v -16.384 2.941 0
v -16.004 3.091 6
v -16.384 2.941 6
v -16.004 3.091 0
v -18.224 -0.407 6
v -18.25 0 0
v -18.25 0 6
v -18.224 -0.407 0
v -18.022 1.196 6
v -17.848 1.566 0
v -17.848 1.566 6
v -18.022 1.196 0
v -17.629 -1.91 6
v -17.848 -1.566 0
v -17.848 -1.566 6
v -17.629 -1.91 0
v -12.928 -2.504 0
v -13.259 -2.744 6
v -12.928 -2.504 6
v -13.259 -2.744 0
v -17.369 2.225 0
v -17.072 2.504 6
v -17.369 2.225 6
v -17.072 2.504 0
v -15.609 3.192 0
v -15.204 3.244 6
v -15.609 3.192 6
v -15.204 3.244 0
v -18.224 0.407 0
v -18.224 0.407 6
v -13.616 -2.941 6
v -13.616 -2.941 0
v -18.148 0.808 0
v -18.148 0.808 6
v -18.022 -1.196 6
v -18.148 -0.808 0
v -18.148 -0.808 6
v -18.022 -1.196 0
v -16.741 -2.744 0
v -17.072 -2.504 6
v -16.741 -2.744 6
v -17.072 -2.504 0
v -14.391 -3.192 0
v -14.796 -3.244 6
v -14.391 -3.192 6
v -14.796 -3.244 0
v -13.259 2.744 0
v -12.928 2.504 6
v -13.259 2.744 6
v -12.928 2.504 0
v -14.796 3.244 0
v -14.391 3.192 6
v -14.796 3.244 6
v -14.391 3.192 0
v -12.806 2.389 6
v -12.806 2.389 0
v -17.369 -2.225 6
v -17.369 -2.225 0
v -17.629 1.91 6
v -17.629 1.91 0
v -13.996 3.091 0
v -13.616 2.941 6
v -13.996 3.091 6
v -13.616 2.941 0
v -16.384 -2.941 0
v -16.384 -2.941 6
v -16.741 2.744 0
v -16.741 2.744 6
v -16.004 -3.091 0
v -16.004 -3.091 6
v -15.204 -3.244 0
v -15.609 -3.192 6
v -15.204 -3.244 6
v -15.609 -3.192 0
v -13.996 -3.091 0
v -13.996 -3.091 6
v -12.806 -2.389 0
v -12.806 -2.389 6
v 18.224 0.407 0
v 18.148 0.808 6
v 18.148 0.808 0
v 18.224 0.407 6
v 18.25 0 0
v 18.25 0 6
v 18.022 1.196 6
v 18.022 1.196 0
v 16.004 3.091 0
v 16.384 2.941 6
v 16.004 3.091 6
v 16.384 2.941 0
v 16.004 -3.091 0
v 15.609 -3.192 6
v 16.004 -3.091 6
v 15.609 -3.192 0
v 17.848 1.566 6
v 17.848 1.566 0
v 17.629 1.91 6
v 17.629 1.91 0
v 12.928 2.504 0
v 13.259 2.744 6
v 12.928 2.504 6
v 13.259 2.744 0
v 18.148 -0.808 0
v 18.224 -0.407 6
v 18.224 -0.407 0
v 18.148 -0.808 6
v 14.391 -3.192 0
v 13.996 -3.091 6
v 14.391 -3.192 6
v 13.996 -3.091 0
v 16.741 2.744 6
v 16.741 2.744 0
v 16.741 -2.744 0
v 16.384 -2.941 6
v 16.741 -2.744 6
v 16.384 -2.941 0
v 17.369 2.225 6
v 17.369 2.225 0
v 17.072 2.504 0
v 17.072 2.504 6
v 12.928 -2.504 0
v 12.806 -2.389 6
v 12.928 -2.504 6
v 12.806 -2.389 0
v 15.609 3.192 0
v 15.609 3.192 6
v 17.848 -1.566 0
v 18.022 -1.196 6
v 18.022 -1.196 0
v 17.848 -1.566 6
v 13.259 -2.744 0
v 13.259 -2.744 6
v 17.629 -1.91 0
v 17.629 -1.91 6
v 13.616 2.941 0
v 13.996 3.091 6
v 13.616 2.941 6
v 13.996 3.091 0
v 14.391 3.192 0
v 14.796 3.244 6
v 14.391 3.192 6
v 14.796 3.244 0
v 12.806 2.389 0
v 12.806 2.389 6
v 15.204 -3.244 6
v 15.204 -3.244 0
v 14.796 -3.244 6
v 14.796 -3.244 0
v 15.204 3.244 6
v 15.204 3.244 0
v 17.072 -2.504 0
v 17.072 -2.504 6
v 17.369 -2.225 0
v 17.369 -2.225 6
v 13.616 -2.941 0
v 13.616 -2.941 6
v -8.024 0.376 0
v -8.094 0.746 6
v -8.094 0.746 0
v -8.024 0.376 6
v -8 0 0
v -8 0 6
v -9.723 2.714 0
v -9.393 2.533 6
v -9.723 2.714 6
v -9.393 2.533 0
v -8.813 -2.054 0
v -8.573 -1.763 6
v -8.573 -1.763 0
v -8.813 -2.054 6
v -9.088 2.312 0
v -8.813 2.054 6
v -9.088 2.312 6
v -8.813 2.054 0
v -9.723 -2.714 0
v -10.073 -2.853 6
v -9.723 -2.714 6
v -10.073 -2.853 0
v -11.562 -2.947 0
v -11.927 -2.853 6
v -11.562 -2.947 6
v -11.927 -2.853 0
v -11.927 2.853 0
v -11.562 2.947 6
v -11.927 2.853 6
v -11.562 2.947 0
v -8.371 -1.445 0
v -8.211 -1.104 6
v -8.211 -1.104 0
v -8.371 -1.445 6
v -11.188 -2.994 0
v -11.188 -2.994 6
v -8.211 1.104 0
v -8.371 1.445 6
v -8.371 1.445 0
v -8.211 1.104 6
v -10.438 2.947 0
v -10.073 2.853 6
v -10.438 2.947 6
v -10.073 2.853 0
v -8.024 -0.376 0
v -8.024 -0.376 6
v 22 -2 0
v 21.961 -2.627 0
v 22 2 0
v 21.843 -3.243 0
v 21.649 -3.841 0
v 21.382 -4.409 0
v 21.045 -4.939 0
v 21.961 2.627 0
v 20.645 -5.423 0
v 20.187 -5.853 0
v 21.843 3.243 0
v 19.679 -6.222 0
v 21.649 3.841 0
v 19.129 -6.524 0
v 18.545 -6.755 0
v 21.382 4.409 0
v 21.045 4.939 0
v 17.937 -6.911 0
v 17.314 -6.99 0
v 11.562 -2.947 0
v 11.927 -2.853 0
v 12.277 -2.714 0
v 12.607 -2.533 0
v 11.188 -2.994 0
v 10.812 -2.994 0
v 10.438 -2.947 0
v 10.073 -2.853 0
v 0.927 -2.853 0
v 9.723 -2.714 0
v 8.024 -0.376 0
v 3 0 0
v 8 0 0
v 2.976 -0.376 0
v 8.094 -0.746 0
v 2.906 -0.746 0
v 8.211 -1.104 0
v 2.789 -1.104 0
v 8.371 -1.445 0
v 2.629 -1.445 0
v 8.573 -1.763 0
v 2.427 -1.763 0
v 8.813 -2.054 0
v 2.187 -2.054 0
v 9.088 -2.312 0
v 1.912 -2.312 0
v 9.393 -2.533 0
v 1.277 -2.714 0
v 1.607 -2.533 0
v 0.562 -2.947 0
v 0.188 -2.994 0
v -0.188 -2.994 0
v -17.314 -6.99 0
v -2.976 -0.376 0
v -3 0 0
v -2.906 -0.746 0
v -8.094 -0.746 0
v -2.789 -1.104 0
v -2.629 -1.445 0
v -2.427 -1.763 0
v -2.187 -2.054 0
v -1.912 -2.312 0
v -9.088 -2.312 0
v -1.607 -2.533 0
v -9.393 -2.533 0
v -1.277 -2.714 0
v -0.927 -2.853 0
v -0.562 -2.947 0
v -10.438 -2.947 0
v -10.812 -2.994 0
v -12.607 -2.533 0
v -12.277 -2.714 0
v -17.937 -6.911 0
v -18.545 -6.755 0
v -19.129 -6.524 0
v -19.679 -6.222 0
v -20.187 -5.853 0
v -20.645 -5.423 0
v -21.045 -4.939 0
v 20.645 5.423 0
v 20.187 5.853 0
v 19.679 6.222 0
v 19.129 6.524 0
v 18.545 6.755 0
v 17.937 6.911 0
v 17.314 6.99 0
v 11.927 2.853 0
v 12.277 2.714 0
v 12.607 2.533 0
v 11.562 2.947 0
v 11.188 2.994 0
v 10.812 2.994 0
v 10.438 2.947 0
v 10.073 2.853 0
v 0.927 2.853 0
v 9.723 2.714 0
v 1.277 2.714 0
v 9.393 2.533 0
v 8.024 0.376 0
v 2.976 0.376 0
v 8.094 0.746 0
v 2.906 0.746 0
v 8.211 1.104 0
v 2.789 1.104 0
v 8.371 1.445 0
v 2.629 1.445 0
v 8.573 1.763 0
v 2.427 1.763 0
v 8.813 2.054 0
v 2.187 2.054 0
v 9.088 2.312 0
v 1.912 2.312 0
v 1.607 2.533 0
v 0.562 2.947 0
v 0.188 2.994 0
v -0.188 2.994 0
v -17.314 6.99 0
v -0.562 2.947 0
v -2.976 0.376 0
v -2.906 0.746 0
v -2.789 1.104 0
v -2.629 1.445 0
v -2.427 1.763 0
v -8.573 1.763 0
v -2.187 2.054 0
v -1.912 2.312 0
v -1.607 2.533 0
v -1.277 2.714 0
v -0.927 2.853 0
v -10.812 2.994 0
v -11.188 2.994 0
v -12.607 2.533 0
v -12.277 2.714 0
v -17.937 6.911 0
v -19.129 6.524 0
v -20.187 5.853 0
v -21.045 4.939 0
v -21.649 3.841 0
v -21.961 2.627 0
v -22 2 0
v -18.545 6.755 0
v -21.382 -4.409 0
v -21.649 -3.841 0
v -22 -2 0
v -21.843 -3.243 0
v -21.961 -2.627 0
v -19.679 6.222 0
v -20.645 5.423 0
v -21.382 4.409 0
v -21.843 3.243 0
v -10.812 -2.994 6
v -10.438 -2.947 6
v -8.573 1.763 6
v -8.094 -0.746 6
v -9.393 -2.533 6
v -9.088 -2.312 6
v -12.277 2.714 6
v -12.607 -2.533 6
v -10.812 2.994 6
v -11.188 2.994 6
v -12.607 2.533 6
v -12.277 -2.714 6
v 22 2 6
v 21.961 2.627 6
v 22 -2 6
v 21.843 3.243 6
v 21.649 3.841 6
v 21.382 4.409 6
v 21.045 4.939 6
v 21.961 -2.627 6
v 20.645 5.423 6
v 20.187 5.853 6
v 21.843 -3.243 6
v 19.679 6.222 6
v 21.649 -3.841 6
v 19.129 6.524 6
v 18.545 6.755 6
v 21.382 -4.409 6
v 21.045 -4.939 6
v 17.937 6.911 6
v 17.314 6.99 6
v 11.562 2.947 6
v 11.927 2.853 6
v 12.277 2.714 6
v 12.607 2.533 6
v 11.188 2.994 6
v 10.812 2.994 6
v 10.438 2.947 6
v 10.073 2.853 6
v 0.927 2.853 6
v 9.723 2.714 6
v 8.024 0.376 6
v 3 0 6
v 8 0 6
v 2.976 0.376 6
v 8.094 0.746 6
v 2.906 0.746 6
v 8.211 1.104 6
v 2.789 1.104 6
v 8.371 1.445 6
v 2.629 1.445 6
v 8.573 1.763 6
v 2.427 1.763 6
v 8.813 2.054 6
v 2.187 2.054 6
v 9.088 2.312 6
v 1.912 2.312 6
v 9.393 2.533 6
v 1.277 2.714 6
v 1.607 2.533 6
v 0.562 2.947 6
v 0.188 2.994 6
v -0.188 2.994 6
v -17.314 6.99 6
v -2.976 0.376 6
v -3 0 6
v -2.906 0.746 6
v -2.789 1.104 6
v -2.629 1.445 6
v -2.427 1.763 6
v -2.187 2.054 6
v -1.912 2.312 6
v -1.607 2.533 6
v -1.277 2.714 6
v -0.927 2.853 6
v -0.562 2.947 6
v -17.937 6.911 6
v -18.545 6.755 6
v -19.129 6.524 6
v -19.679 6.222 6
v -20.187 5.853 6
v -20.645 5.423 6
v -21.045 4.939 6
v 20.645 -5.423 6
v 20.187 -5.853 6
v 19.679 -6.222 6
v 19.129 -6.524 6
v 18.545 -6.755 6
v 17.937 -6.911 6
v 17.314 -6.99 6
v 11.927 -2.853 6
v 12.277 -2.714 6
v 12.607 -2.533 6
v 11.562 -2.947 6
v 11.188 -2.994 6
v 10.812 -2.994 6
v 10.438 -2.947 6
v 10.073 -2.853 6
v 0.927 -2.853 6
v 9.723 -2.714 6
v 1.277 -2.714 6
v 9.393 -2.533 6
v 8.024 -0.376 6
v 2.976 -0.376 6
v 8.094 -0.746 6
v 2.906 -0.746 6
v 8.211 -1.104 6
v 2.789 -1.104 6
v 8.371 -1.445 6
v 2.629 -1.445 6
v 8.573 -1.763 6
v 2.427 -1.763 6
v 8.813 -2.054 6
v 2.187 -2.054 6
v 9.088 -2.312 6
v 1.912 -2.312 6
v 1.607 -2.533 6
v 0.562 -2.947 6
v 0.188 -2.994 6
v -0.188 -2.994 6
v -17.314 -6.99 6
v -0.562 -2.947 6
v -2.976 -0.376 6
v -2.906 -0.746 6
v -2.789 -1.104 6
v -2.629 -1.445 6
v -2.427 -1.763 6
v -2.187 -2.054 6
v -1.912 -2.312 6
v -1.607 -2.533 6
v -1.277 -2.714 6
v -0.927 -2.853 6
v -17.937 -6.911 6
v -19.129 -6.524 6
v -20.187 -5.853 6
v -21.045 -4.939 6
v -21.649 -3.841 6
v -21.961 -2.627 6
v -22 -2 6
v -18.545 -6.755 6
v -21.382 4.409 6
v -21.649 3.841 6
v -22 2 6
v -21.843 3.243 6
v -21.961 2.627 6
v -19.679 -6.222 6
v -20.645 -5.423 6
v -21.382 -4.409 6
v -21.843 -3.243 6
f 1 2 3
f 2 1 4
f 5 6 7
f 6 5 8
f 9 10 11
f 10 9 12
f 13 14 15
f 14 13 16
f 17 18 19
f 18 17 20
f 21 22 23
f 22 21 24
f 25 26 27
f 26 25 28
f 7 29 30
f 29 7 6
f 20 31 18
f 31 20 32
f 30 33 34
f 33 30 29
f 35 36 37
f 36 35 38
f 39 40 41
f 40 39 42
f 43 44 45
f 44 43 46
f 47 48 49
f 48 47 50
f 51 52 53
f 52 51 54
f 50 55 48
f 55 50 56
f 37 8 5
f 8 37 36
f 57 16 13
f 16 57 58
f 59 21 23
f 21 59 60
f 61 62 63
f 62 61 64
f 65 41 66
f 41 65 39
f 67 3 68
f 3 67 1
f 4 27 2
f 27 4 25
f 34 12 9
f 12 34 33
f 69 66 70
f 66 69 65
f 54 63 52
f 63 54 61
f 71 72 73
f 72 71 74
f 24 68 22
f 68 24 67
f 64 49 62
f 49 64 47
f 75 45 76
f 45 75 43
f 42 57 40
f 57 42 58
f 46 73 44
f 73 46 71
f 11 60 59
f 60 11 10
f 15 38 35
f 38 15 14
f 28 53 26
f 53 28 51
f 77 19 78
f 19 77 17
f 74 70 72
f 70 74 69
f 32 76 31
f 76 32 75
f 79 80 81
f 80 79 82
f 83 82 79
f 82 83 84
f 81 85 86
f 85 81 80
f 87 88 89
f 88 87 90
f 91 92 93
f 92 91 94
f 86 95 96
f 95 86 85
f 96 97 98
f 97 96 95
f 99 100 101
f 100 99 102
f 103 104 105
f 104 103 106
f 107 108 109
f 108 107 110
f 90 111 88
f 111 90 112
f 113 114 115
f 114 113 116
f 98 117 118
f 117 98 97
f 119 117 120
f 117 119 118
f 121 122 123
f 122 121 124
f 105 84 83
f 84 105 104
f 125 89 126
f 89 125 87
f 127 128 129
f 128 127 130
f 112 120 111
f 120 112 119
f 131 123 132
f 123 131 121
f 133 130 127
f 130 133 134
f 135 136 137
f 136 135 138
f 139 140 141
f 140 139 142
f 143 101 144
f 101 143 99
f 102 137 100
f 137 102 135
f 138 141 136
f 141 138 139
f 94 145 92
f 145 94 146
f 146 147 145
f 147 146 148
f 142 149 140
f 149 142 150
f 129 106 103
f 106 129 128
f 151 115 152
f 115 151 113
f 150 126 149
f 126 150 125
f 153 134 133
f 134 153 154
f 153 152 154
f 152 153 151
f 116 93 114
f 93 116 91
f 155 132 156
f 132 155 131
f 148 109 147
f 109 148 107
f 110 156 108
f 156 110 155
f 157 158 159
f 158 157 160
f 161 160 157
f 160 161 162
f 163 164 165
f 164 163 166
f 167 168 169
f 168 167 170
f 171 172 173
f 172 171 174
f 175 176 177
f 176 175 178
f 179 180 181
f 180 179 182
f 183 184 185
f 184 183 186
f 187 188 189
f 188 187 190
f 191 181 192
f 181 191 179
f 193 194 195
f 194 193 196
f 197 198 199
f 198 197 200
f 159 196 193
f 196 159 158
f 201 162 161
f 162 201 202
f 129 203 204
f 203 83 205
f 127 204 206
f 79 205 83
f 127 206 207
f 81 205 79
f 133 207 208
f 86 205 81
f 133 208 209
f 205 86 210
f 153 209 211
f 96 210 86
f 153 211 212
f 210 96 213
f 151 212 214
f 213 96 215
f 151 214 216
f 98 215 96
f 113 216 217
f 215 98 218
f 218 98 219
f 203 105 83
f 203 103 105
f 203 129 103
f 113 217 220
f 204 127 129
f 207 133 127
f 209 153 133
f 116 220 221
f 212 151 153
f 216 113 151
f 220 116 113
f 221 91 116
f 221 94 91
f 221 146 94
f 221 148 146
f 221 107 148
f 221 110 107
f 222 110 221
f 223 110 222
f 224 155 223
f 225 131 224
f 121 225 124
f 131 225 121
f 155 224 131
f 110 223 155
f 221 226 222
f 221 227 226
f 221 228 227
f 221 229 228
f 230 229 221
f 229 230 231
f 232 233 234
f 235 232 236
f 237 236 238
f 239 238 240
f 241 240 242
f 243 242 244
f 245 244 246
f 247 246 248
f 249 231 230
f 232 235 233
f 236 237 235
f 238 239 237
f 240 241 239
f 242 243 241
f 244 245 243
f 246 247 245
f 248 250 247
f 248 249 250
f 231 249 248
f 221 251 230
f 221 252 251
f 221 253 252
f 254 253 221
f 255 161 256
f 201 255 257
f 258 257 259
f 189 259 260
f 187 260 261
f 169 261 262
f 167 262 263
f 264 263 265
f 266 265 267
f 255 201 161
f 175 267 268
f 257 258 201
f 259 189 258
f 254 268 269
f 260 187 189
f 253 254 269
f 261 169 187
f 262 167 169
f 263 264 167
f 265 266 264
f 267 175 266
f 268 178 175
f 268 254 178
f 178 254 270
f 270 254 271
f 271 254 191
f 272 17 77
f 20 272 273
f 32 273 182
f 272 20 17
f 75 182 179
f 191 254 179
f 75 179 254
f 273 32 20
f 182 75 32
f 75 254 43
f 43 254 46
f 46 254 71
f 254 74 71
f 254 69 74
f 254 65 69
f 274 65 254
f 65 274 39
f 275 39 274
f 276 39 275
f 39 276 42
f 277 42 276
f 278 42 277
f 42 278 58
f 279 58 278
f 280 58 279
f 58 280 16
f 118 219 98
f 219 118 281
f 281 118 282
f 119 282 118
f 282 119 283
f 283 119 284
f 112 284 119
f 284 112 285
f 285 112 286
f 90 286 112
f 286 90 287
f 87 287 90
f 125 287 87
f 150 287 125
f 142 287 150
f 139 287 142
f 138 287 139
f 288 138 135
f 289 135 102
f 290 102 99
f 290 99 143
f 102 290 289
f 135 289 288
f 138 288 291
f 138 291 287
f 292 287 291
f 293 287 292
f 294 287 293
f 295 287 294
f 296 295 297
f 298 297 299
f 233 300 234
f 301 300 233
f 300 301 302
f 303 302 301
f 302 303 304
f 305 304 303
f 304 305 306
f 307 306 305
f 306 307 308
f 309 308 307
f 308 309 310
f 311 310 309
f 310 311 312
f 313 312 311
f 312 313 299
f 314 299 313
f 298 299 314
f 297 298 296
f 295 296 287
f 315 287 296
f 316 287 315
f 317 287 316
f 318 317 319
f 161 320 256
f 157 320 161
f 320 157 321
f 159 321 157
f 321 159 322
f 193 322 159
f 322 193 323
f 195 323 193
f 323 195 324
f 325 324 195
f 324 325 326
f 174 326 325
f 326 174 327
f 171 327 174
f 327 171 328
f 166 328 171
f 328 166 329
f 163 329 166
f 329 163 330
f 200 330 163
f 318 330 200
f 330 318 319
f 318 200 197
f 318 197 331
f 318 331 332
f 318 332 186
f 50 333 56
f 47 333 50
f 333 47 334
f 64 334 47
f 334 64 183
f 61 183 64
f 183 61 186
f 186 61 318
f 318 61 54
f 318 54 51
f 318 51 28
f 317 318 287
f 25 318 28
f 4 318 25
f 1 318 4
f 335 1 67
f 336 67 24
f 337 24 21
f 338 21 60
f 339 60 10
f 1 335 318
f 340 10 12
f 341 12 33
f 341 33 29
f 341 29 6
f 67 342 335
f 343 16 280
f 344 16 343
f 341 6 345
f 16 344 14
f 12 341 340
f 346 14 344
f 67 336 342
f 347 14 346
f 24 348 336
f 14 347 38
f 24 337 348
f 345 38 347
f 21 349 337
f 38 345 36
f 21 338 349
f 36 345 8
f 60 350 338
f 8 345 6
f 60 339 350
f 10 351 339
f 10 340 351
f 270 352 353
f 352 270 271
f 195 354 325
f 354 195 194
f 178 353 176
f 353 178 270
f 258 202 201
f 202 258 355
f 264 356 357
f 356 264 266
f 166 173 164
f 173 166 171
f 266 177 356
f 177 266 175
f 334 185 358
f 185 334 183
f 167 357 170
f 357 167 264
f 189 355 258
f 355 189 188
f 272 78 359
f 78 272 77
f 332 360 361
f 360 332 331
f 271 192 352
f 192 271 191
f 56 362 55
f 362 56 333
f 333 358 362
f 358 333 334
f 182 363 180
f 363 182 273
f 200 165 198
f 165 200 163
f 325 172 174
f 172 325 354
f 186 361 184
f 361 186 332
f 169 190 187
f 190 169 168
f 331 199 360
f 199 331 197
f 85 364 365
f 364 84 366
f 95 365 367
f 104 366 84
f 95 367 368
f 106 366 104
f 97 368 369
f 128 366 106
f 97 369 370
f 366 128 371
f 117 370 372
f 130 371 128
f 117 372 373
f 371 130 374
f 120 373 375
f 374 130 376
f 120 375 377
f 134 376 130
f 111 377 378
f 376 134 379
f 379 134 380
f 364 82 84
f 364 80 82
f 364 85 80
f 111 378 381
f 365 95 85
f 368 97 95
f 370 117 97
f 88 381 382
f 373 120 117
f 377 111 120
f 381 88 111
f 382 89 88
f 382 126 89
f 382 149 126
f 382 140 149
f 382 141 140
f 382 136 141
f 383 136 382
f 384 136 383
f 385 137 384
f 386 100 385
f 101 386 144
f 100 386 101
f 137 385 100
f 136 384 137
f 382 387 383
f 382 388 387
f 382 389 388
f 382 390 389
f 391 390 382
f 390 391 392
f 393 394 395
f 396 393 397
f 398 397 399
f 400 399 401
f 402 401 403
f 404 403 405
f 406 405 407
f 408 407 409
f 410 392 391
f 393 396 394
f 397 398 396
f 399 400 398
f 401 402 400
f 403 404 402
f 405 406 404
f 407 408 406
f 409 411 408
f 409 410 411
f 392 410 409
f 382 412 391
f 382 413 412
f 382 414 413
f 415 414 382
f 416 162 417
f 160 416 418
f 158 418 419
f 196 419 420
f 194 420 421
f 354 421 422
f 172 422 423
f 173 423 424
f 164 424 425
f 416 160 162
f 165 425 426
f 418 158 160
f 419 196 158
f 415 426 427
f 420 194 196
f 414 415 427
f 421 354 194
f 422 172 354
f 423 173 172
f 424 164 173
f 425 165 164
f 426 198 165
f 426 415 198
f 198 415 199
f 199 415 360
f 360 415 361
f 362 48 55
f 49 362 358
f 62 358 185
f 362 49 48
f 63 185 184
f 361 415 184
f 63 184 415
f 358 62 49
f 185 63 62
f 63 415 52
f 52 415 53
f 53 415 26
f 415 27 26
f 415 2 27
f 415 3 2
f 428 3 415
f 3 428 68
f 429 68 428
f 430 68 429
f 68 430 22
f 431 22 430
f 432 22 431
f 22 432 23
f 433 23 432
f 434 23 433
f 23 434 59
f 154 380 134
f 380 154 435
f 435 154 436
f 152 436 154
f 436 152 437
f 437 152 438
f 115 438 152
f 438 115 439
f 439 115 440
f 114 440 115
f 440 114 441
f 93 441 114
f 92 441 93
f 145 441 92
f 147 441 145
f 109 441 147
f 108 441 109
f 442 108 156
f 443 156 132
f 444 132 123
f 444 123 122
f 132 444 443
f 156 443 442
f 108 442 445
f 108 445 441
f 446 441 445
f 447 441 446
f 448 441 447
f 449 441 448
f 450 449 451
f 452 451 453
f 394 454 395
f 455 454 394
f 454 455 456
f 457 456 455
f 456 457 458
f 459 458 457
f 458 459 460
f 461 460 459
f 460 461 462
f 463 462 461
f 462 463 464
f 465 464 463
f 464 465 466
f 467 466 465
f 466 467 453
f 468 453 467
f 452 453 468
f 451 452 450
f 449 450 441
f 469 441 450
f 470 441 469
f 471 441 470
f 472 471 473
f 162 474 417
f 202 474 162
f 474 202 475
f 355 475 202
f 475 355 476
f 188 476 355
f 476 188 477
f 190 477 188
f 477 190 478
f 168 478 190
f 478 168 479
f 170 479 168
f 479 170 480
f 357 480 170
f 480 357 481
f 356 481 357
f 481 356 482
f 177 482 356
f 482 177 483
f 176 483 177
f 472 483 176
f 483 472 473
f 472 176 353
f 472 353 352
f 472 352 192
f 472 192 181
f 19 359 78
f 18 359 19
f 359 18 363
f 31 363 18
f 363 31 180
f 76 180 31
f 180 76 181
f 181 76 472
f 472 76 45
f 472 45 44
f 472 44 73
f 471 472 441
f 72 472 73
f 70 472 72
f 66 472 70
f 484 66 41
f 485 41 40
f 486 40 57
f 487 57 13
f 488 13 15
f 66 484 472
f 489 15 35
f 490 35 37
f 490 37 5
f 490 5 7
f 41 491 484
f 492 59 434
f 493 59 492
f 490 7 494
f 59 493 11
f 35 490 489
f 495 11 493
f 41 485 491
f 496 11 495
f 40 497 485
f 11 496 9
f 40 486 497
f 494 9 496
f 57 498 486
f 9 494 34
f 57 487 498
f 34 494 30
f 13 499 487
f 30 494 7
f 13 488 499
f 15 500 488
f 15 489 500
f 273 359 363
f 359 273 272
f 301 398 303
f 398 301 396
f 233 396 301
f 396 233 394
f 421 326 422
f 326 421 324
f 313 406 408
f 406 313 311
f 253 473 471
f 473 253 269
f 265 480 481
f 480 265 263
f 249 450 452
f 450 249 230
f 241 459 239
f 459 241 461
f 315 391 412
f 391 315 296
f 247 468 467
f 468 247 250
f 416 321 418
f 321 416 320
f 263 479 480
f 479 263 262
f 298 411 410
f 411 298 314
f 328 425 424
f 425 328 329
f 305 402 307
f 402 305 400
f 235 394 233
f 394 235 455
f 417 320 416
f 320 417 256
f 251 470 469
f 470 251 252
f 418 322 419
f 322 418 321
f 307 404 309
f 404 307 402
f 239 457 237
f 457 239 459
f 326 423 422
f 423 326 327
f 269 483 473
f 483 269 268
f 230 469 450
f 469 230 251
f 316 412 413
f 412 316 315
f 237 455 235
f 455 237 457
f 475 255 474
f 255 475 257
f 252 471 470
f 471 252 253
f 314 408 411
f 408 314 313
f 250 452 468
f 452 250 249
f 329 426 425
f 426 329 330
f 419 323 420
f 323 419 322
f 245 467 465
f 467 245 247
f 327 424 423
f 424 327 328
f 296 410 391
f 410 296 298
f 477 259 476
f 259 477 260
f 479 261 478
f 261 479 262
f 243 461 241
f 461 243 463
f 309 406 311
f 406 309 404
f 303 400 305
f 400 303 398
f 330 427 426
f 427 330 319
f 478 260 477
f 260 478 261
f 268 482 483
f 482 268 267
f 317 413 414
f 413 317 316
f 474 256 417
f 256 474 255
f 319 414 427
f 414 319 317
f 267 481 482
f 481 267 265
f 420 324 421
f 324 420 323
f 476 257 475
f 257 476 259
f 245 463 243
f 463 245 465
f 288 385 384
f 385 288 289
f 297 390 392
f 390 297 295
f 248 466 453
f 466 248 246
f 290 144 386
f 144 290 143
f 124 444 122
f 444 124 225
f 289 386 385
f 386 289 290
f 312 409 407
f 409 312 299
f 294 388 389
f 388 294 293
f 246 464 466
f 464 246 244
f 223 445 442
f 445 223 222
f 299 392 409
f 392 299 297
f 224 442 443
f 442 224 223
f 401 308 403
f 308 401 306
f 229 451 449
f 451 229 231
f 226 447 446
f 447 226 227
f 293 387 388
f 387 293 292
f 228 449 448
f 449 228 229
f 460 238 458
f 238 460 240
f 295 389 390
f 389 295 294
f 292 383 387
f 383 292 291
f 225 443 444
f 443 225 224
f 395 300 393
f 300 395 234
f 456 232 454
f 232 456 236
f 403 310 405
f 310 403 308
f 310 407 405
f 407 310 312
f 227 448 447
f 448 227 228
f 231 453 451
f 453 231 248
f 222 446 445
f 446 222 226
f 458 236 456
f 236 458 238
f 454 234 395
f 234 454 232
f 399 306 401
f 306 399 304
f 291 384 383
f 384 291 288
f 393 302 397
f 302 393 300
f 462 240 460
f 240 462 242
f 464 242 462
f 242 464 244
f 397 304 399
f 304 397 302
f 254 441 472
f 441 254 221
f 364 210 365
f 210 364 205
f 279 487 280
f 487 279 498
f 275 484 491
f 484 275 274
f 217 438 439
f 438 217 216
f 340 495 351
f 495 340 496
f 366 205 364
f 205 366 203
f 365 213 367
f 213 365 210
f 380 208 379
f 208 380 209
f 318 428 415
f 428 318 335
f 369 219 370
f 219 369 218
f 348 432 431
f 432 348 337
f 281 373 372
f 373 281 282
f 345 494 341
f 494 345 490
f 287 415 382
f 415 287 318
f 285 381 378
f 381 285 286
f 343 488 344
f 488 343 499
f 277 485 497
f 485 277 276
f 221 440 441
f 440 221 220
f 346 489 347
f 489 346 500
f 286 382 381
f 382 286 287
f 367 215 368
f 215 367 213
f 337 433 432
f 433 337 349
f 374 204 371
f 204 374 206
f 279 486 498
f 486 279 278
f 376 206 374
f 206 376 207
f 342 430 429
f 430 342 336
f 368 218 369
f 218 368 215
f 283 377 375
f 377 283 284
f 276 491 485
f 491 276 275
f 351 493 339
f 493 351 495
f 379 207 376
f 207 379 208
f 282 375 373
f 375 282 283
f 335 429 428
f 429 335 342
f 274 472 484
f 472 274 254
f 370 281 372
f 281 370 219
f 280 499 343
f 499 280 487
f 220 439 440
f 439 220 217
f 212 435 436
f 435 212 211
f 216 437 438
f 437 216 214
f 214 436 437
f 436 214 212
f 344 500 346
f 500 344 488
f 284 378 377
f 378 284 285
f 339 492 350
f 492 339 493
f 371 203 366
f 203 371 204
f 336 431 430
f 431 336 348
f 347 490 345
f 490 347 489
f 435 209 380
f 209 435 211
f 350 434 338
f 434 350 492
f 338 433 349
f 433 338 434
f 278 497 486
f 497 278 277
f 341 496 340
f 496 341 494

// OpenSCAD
$fn = 50;

difference() {
	union() {
		hull() {
			translate(v = [-17.0, 2.0, 0]) {
				cylinder(h = 6, r = 5);
			}
			translate(v = [17.0, 2.0, 0]) {
				cylinder(h = 6, r = 5);
			}
			translate(v = [-17.0, -2.0, 0]) {
				cylinder(h = 6, r = 5);
			}
			translate(v = [17.0, -2.0, 0]) {
				cylinder(h = 6, r = 5);
			}
		}
	}
	union() {
		translate(v = [-15.0, 0.0, -100.0]) {
			cylinder(h = 200, r = 3.25);
		}
		translate(v = [15.0, 0.0, -100.0]) {
			cylinder(h = 200, r = 3.25);
		}
		translate(v = [-15.0, 0.0, -100.0]) {
			cylinder(h = 200, r = 1.8);
		}
		translate(v = [15.0, 0.0, -100.0]) {
			cylinder(h = 200, r = 1.8);
		}
		translate(v = [-11.0, 0, 0.0]) {
			cylinder(h = 6, r = 3.0);
		}
		cylinder(h = 6, r = 3.0);
		translate(v = [11.0, 0, 0.0]) {
			cylinder(h = 6, r = 3.0);
		}
	}
}
